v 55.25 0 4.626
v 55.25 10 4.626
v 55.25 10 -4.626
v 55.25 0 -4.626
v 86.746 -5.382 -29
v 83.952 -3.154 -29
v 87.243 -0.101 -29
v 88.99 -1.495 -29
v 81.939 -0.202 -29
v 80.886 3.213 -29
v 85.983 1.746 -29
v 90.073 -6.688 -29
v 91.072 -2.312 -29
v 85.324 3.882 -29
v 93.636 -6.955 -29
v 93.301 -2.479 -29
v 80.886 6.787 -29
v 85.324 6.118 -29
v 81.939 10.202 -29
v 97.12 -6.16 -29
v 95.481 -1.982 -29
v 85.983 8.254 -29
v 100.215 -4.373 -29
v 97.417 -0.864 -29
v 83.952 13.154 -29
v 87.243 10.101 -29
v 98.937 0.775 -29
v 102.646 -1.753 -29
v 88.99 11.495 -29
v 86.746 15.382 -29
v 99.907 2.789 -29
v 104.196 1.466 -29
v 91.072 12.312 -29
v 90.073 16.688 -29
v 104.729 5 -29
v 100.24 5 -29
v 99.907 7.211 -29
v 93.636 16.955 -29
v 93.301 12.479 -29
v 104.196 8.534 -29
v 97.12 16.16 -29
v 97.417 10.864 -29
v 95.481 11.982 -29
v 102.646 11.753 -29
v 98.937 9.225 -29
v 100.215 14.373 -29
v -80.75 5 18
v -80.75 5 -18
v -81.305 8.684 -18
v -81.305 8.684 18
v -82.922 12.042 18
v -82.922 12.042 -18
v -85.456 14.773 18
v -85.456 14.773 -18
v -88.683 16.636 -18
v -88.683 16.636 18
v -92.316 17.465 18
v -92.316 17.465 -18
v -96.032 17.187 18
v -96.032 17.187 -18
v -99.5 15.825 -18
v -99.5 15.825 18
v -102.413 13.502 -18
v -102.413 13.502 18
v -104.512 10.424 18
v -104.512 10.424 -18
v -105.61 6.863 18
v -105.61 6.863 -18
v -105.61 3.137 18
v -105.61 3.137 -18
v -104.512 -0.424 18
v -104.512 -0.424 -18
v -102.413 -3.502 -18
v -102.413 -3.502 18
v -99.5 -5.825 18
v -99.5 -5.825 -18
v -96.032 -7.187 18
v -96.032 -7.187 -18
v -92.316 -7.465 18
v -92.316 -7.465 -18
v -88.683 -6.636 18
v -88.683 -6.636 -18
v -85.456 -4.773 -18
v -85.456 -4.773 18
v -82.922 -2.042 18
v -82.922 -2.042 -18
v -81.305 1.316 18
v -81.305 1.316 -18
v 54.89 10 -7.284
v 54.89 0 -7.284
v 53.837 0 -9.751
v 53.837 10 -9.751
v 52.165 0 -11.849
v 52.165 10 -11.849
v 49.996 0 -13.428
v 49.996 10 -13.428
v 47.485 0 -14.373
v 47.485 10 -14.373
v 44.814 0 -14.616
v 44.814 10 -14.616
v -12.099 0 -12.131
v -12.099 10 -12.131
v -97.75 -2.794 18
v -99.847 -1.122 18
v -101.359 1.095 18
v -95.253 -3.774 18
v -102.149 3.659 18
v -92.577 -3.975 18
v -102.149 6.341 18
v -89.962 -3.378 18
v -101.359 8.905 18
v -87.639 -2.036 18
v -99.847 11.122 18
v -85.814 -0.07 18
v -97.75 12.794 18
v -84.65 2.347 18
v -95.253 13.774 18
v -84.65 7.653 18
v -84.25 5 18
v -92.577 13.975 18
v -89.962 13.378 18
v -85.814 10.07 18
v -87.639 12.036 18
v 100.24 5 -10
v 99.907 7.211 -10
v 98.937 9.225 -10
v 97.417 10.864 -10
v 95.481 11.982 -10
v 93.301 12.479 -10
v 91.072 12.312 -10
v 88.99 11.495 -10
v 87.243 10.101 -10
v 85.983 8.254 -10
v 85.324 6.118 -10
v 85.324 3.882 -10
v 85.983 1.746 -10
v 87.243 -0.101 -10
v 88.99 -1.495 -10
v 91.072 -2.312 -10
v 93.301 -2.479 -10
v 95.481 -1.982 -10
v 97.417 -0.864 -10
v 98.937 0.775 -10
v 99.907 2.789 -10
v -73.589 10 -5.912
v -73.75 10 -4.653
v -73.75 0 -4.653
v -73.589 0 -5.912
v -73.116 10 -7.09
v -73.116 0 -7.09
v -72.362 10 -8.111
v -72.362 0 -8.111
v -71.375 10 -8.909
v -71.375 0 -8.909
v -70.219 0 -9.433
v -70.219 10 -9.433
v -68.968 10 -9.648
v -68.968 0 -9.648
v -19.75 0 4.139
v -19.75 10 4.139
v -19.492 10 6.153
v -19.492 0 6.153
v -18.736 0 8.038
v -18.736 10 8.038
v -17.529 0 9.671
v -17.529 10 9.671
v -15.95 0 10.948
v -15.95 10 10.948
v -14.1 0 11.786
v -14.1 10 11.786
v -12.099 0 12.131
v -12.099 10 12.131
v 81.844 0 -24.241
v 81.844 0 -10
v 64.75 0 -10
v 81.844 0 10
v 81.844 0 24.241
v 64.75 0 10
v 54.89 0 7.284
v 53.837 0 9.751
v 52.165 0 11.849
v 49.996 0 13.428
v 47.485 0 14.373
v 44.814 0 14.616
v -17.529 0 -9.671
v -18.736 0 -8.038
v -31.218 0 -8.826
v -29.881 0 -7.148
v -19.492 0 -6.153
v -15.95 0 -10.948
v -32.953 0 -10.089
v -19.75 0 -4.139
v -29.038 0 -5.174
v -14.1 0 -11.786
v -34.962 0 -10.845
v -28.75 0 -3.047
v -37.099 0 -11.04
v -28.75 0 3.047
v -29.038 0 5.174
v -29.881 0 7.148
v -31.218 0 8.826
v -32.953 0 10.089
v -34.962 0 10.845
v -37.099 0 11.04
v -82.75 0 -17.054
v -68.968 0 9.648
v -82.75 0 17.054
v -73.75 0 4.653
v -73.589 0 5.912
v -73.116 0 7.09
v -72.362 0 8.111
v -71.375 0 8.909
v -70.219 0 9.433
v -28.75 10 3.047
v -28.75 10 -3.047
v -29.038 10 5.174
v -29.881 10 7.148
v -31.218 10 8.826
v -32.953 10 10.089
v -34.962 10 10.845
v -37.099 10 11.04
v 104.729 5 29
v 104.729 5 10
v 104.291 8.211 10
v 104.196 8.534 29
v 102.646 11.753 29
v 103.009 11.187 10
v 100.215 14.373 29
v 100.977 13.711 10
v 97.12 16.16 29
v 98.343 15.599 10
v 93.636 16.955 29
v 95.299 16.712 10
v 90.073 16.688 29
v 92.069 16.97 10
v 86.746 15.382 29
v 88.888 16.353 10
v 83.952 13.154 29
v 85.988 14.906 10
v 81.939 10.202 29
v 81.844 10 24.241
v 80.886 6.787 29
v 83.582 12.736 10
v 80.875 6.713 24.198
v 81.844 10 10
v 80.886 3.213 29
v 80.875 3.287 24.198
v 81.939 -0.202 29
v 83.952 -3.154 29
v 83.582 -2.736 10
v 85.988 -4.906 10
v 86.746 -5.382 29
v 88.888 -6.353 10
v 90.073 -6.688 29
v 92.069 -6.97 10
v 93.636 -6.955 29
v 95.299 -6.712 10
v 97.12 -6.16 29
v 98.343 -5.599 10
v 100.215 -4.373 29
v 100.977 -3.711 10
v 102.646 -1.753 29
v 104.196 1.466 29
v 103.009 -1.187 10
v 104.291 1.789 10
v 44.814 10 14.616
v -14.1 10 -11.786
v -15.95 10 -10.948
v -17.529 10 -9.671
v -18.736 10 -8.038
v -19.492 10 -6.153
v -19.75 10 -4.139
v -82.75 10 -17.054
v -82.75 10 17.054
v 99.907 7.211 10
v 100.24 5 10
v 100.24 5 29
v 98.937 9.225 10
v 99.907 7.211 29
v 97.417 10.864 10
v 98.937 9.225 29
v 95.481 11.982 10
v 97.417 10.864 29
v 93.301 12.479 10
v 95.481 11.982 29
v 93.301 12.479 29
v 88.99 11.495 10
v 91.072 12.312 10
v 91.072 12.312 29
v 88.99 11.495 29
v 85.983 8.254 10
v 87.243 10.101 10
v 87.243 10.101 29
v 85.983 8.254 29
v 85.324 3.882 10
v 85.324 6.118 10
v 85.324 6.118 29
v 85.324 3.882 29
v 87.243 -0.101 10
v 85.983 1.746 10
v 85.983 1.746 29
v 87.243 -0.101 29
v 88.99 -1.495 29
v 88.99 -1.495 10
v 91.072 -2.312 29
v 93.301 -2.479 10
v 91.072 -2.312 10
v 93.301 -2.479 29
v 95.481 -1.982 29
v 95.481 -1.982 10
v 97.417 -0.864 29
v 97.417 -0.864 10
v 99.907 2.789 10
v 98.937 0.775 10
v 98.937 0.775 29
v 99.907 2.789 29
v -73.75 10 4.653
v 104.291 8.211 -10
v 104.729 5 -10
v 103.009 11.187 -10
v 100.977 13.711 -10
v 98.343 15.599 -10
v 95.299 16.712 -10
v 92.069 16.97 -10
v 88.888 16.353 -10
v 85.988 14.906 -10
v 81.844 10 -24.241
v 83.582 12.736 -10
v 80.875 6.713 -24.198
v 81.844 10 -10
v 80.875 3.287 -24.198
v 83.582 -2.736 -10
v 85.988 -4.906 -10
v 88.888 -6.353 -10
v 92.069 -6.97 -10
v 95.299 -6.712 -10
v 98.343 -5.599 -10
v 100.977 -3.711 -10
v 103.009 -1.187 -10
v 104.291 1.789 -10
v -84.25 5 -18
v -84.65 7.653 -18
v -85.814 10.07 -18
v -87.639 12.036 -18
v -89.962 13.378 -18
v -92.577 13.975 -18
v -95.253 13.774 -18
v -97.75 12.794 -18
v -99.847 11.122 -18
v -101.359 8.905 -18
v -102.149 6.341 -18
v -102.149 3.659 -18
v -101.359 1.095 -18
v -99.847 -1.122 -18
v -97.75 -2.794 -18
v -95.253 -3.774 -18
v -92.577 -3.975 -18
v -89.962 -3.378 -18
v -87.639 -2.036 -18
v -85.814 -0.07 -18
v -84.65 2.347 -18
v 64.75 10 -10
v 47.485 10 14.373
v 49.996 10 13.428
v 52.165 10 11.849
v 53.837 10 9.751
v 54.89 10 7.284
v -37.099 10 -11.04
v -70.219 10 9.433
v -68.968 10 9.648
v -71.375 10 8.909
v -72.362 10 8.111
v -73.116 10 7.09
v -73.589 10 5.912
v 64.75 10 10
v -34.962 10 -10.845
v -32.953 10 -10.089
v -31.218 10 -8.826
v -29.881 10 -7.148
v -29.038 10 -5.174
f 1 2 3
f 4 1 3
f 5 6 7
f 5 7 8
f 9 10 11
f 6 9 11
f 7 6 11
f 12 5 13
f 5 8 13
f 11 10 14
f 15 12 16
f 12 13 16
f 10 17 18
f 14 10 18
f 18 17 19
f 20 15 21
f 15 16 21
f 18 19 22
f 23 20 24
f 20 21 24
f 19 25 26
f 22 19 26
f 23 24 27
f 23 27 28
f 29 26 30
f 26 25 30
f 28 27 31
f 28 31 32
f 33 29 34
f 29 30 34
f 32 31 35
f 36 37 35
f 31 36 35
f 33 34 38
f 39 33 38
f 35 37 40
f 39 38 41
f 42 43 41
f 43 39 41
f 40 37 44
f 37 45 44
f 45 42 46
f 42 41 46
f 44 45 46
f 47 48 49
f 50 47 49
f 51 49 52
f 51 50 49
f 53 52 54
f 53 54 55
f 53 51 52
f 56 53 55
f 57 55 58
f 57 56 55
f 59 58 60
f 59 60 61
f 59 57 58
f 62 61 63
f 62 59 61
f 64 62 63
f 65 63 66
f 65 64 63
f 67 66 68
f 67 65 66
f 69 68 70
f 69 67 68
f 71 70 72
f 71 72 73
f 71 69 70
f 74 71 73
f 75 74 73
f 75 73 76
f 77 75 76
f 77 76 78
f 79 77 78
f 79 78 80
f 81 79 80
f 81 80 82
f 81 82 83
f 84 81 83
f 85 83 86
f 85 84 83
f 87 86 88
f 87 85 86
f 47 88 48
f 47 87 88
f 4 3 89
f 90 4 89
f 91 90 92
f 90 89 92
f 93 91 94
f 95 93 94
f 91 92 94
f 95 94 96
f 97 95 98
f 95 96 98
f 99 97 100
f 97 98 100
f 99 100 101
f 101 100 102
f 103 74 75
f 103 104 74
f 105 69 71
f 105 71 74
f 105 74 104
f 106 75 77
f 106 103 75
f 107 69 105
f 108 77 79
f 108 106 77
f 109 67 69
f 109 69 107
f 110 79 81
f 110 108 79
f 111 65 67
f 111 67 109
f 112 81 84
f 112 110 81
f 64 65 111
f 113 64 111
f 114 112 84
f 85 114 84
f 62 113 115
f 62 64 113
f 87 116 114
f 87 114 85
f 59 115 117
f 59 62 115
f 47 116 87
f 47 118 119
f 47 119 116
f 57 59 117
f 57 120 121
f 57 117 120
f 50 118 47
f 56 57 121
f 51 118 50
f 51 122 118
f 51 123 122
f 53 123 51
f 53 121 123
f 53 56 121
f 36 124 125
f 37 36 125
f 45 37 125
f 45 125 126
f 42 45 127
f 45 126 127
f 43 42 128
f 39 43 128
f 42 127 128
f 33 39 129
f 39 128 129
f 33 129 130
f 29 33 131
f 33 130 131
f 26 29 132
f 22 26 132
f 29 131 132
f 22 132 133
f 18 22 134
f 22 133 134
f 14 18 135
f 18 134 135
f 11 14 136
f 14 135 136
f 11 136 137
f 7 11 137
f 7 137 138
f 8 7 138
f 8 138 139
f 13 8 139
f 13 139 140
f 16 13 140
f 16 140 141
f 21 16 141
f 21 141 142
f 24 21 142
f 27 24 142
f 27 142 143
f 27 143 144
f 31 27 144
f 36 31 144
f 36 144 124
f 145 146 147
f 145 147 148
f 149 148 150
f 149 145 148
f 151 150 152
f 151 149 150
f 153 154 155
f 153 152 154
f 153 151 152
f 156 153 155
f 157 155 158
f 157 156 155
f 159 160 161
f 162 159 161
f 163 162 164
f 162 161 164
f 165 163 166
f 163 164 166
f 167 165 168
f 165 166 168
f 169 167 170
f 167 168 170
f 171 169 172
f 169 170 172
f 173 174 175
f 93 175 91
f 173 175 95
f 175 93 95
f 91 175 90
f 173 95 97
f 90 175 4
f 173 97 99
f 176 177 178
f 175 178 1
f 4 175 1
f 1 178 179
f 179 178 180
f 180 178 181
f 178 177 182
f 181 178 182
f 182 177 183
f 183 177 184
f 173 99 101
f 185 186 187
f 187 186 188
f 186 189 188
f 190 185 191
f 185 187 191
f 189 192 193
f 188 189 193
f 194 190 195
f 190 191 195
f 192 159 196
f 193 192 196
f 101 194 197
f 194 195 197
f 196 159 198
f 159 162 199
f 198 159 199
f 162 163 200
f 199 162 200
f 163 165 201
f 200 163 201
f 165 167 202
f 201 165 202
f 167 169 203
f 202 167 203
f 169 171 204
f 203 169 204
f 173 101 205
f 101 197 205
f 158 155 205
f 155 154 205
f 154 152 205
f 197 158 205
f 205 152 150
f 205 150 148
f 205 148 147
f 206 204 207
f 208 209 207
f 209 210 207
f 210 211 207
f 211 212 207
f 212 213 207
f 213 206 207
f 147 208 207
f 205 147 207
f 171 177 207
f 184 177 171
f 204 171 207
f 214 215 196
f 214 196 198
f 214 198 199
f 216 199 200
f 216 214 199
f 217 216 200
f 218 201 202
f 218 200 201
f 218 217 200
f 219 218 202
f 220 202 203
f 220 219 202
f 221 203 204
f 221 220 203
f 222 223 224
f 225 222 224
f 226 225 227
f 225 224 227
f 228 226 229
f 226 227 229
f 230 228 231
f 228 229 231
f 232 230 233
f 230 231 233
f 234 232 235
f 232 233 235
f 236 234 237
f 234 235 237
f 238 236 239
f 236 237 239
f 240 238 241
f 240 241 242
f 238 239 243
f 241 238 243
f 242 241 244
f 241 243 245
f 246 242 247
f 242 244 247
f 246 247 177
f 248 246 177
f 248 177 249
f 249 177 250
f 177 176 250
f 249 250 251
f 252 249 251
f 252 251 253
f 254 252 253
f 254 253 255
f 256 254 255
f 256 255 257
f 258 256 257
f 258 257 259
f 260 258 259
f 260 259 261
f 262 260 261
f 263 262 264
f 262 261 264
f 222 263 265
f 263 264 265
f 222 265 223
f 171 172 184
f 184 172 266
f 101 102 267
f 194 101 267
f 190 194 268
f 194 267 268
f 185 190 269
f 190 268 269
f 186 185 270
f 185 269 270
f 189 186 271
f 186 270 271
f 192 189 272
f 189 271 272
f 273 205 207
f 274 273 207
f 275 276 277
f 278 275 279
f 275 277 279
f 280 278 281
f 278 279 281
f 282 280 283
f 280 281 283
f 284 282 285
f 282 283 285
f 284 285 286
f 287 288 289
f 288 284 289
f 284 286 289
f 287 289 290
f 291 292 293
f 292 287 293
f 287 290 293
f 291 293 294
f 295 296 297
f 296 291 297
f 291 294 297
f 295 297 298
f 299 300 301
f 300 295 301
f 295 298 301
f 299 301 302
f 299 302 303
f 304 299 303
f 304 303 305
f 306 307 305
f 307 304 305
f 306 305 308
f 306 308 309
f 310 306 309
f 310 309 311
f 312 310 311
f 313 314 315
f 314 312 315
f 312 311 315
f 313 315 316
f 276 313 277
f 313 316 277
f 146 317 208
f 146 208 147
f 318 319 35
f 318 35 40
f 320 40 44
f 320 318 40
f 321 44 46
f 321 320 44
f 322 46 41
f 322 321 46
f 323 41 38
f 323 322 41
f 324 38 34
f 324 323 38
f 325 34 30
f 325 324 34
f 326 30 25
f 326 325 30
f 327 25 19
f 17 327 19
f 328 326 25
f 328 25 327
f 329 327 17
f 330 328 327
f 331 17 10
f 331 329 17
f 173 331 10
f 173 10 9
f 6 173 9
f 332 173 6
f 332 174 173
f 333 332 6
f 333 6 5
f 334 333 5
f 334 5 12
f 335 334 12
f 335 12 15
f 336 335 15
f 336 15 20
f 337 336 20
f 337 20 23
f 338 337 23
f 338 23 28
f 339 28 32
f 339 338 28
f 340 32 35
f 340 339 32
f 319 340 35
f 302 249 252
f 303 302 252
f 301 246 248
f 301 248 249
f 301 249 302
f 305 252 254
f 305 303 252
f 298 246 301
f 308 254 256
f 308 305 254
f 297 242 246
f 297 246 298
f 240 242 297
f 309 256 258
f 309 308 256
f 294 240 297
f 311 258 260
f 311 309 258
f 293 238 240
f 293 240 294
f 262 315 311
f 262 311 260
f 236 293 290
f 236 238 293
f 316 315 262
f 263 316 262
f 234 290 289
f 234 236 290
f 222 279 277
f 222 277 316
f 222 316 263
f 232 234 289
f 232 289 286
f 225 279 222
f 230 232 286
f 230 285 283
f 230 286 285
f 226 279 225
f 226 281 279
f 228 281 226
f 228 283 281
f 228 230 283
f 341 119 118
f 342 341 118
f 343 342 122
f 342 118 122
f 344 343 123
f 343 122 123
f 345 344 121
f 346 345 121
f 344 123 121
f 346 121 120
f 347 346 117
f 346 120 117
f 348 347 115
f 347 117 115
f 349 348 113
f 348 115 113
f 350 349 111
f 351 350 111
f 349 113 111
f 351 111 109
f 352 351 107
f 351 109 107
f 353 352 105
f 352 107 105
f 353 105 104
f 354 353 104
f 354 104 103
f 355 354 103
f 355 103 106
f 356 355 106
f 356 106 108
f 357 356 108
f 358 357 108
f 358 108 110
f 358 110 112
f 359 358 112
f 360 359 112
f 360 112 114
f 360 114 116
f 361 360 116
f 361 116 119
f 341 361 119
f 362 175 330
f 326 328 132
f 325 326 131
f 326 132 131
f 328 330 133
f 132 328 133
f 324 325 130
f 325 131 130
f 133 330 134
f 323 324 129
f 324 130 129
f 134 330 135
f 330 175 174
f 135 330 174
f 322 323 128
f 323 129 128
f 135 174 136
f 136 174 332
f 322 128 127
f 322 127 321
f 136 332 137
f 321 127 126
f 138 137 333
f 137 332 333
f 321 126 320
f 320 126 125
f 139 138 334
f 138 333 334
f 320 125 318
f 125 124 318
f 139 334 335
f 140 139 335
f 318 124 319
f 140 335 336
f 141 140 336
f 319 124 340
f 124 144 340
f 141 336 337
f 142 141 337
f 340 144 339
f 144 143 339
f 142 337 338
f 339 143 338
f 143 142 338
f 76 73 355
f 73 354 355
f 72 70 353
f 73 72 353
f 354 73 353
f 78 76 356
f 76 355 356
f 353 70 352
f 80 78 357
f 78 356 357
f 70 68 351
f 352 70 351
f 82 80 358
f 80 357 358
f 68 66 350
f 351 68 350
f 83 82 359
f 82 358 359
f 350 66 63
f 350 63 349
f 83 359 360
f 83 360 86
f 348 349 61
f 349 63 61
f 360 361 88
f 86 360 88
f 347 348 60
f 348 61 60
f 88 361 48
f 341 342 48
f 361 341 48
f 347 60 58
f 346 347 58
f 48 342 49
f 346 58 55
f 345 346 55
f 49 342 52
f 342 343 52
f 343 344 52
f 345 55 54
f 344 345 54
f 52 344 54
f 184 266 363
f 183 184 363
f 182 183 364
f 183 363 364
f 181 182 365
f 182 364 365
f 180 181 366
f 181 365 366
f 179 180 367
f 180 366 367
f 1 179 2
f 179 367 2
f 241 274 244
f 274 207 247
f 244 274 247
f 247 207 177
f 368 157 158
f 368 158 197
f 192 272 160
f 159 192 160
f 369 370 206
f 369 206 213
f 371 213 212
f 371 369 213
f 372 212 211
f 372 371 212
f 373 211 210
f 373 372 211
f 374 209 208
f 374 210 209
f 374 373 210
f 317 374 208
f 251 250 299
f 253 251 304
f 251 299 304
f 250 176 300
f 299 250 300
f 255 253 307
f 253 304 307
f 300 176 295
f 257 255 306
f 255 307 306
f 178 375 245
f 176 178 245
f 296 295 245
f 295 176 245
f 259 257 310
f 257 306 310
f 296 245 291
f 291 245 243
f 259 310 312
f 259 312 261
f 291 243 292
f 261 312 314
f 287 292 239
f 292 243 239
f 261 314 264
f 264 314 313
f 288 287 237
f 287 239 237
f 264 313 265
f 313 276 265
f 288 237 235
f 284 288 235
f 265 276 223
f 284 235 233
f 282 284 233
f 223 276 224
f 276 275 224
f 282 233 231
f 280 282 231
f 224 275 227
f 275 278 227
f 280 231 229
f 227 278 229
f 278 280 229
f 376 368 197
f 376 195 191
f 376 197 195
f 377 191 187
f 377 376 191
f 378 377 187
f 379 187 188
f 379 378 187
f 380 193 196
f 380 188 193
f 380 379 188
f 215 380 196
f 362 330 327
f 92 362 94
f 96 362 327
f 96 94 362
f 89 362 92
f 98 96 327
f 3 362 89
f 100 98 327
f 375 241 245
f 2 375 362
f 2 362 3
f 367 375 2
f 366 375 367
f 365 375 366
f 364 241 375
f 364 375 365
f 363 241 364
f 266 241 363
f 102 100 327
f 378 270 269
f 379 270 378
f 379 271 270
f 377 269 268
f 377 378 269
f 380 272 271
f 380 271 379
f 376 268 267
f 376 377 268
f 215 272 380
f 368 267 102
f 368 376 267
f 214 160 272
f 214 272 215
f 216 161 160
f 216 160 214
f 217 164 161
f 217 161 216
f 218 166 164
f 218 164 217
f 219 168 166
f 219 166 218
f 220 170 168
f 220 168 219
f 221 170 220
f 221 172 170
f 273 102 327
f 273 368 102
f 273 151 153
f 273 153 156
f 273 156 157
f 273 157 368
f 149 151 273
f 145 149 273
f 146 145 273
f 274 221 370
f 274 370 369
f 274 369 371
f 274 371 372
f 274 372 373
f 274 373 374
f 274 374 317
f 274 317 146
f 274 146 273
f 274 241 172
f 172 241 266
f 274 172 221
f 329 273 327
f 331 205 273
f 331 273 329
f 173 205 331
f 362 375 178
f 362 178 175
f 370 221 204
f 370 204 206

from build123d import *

# Parameters (mm, degrees)
BOSS_EXTRUDE1_DEPTH      = 10
SKETCH2_W                = 45.039354618
SKETCH2_H                = 20
CUT_EXTRUDE1_DEPTH       = 11
SKETCH3_R                = 12.5
BOSS_EXTRUDE2_DEPTH      = 18
BOSS_EXTRUDE2_DEPTH_BACK = 18
SKETCH4_R                = 9
CUT_EXTRUDE2_DEPTH       = 43.280210121
SKETCH7_R                = 11.988578659
BOSS_EXTRUDE4_DEPTH      = 29
BOSS_EXTRUDE4_DEPTH_BACK = 29
SKETCH8_R                = 7.5
CUT_EXTRUDE3_DEPTH       = 59
SKETCH2_2_W              = 45.039354618
SKETCH2_2_H              = 20
CUT_EXTRUDE4_DEPTH       = 18.5
SKETCH2_3_W              = 45.039354618
SKETCH2_3_H              = 20
CUT_EXTRUDE5_DEPTH       = 8.5
CUT_EXTRUDE5_DEPTH_BACK  = 18.5


with BuildPart() as part:
    # Sketch1 → Boss-Extrude1 (new body)
    with BuildSketch(Plane(origin=(0, 0, 0), x_dir=(1, 0, 0), z_dir=(0, 1, 0))):
        Polygon((-82.75, 0), (-82.75, 17.05432407), (82.75, 24.280210121), (82.75, 0), align=None)
    boss_extrude1 = extrude(amount=BOSS_EXTRUDE1_DEPTH)

    # Mirror1: Boss-Extrude1 across plane
    add(boss_extrude1.mirror(Plane.XY))

    # Sketch2 → Cut-Extrude1 (cut, through all)
    with BuildSketch(Plane(origin=(0, 10, 0), x_dir=(1, 0, 0), z_dir=(0, 1, 0))):
        with BuildLine():
            Line((-68.968096937, 9.648433472), (-37.098955099, 11.039870254))
            ThreePointArc((-37.098955099, 11.039870254), (-31.217895554, 8.826396178), (-28.75, 3.047484481))
            Line((-28.75, 3.047484481), (-28.75, -3.047484481))
            ThreePointArc((-28.75, -3.047484481), (-31.217895554, -8.826396178), (-37.098955099, -11.039870254))
            Line((-37.098955099, -11.039870254), (-68.968096937, -9.648433472))
            ThreePointArc((-68.968096937, -9.648433472), (-72.36181981, -8.110757643), (-73.75, -4.653192364))
            Line((-73.75, -4.653192364), (-73.75, 4.653192364))
            ThreePointArc((-73.75, 4.653192364), (-72.36181981, 8.110757643), (-68.968096937, 9.648433472))
        make_face()
        with BuildLine():
            Line((-19.75, 4.139008054), (-19.75, -4.139008054))
            ThreePointArc((-19.75, -4.139008054), (-17.528911696, -9.6711125), (-12.098955099, -12.131393827))
            Line((-12.098955099, -12.131393827), (44.813806126, -14.616258645))
            ThreePointArc((44.813806126, -14.616258645), (52.165130558, -11.84941605), (55.25, -4.625776429))
            Line((55.25, -4.625776429), (55.25, 4.625776429))
            ThreePointArc((55.25, 4.625776429), (52.165130558, 11.84941605), (44.813806126, 14.616258645))
            Line((44.813806126, 14.616258645), (-12.098955099, 12.131393827))
            ThreePointArc((-12.098955099, 12.131393827), (-17.528911696, 9.6711125), (-19.75, 4.139008054))
        make_face()
        with Locations((87.269677309, 0)):
            Rectangle(SKETCH2_W, SKETCH2_H)
    extrude(amount=-CUT_EXTRUDE1_DEPTH, mode=Mode.SUBTRACT)

    # Sketch7 → Boss-Extrude4 (add, two sides)
    with BuildSketch(Plane.XY) as boss_extrude4_sk:
        with Locations((92.740482216, 5)):
            Circle(SKETCH7_R)
    extrude(amount=BOSS_EXTRUDE4_DEPTH)
    extrude(boss_extrude4_sk.sketch, amount=-BOSS_EXTRUDE4_DEPTH_BACK)

    # Sketch8 → Cut-Extrude3 (cut, through all)
    with BuildSketch(Plane.XY.offset(29)):
        with Locations((92.740482216, 5)):
            Circle(SKETCH8_R)
    extrude(amount=-CUT_EXTRUDE3_DEPTH, mode=Mode.SUBTRACT)

    # Sketch2<2> → Cut-Extrude4 (cut, through all)
    with BuildSketch(Plane(origin=(0, 10, 0), x_dir=(1, 0, 0), z_dir=(0, 1, 0))):
        with BuildLine():
            Line((-68.968096937, 9.648433472), (-37.098955099, 11.039870254))
            ThreePointArc((-37.098955099, 11.039870254), (-31.217895554, 8.826396178), (-28.75, 3.047484481))
            Line((-28.75, 3.047484481), (-28.75, -3.047484481))
            ThreePointArc((-28.75, -3.047484481), (-31.217895554, -8.826396178), (-37.098955099, -11.039870254))
            Line((-37.098955099, -11.039870254), (-68.968096937, -9.648433472))
            ThreePointArc((-68.968096937, -9.648433472), (-72.36181981, -8.110757643), (-73.75, -4.653192364))
            Line((-73.75, -4.653192364), (-73.75, 4.653192364))
            ThreePointArc((-73.75, 4.653192364), (-72.36181981, 8.110757643), (-68.968096937, 9.648433472))
        make_face()
        with BuildLine():
            Line((-19.75, 4.139008054), (-19.75, -4.139008054))
            ThreePointArc((-19.75, -4.139008054), (-17.528911696, -9.6711125), (-12.098955099, -12.131393827))
            Line((-12.098955099, -12.131393827), (44.813806126, -14.616258645))
            ThreePointArc((44.813806126, -14.616258645), (52.165130558, -11.84941605), (55.25, -4.625776429))
            Line((55.25, -4.625776429), (55.25, 4.625776429))
            ThreePointArc((55.25, 4.625776429), (52.165130558, 11.84941605), (44.813806126, 14.616258645))
            Line((44.813806126, 14.616258645), (-12.098955099, 12.131393827))
            ThreePointArc((-12.098955099, 12.131393827), (-17.528911696, 9.6711125), (-19.75, 4.139008054))
        make_face()
        with Locations((87.269677309, 0)):
            Rectangle(SKETCH2_2_W, SKETCH2_2_H)
    extrude(amount=-CUT_EXTRUDE4_DEPTH, mode=Mode.SUBTRACT)

    # Sketch2<3> → Cut-Extrude5 (cut, two sides)
    with BuildSketch(Plane(origin=(0, 10, 0), x_dir=(1, 0, 0), z_dir=(0, 1, 0))) as cut_extrude5_sk:
        with BuildLine():
            Line((-68.968096937, 9.648433472), (-37.098955099, 11.039870254))
            ThreePointArc((-37.098955099, 11.039870254), (-31.217895554, 8.826396178), (-28.75, 3.047484481))
            Line((-28.75, 3.047484481), (-28.75, -3.047484481))
            ThreePointArc((-28.75, -3.047484481), (-31.217895554, -8.826396178), (-37.098955099, -11.039870254))
            Line((-37.098955099, -11.039870254), (-68.968096937, -9.648433472))
            ThreePointArc((-68.968096937, -9.648433472), (-72.36181981, -8.110757643), (-73.75, -4.653192364))
            Line((-73.75, -4.653192364), (-73.75, 4.653192364))
            ThreePointArc((-73.75, 4.653192364), (-72.36181981, 8.110757643), (-68.968096937, 9.648433472))
        make_face()
        with BuildLine():
            Line((-19.75, 4.139008054), (-19.75, -4.139008054))
            ThreePointArc((-19.75, -4.139008054), (-17.528911696, -9.6711125), (-12.098955099, -12.131393827))
            Line((-12.098955099, -12.131393827), (44.813806126, -14.616258645))
            ThreePointArc((44.813806126, -14.616258645), (52.165130558, -11.84941605), (55.25, -4.625776429))
            Line((55.25, -4.625776429), (55.25, 4.625776429))
            ThreePointArc((55.25, 4.625776429), (52.165130558, 11.84941605), (44.813806126, 14.616258645))
            Line((44.813806126, 14.616258645), (-12.098955099, 12.131393827))
            ThreePointArc((-12.098955099, 12.131393827), (-17.528911696, 9.6711125), (-19.75, 4.139008054))
        make_face()
        with Locations((87.269677309, 0)):
            Rectangle(SKETCH2_3_W, SKETCH2_3_H)
    extrude(amount=CUT_EXTRUDE5_DEPTH, mode=Mode.SUBTRACT)
    extrude(cut_extrude5_sk.sketch, amount=-CUT_EXTRUDE5_DEPTH_BACK, mode=Mode.SUBTRACT)


with BuildPart() as body_2:
    # Sketch3 → Boss-Extrude2 (new body, two sides)
    with BuildSketch(Plane.XY) as boss_extrude2_sk:
        with Locations((-93.25, 5)):
            Circle(SKETCH3_R)
    extrude(amount=BOSS_EXTRUDE2_DEPTH)
    extrude(boss_extrude2_sk.sketch, amount=-BOSS_EXTRUDE2_DEPTH_BACK)

    # Sketch4 → Cut-Extrude2 (cut, through all)
    with BuildSketch(Plane.XY.offset(18)):
        with Locations((-93.25, 5)):
            Circle(SKETCH4_R)
    extrude(amount=-CUT_EXTRUDE2_DEPTH, mode=Mode.SUBTRACT)


solid = Compound([part.part, body_2.part])
